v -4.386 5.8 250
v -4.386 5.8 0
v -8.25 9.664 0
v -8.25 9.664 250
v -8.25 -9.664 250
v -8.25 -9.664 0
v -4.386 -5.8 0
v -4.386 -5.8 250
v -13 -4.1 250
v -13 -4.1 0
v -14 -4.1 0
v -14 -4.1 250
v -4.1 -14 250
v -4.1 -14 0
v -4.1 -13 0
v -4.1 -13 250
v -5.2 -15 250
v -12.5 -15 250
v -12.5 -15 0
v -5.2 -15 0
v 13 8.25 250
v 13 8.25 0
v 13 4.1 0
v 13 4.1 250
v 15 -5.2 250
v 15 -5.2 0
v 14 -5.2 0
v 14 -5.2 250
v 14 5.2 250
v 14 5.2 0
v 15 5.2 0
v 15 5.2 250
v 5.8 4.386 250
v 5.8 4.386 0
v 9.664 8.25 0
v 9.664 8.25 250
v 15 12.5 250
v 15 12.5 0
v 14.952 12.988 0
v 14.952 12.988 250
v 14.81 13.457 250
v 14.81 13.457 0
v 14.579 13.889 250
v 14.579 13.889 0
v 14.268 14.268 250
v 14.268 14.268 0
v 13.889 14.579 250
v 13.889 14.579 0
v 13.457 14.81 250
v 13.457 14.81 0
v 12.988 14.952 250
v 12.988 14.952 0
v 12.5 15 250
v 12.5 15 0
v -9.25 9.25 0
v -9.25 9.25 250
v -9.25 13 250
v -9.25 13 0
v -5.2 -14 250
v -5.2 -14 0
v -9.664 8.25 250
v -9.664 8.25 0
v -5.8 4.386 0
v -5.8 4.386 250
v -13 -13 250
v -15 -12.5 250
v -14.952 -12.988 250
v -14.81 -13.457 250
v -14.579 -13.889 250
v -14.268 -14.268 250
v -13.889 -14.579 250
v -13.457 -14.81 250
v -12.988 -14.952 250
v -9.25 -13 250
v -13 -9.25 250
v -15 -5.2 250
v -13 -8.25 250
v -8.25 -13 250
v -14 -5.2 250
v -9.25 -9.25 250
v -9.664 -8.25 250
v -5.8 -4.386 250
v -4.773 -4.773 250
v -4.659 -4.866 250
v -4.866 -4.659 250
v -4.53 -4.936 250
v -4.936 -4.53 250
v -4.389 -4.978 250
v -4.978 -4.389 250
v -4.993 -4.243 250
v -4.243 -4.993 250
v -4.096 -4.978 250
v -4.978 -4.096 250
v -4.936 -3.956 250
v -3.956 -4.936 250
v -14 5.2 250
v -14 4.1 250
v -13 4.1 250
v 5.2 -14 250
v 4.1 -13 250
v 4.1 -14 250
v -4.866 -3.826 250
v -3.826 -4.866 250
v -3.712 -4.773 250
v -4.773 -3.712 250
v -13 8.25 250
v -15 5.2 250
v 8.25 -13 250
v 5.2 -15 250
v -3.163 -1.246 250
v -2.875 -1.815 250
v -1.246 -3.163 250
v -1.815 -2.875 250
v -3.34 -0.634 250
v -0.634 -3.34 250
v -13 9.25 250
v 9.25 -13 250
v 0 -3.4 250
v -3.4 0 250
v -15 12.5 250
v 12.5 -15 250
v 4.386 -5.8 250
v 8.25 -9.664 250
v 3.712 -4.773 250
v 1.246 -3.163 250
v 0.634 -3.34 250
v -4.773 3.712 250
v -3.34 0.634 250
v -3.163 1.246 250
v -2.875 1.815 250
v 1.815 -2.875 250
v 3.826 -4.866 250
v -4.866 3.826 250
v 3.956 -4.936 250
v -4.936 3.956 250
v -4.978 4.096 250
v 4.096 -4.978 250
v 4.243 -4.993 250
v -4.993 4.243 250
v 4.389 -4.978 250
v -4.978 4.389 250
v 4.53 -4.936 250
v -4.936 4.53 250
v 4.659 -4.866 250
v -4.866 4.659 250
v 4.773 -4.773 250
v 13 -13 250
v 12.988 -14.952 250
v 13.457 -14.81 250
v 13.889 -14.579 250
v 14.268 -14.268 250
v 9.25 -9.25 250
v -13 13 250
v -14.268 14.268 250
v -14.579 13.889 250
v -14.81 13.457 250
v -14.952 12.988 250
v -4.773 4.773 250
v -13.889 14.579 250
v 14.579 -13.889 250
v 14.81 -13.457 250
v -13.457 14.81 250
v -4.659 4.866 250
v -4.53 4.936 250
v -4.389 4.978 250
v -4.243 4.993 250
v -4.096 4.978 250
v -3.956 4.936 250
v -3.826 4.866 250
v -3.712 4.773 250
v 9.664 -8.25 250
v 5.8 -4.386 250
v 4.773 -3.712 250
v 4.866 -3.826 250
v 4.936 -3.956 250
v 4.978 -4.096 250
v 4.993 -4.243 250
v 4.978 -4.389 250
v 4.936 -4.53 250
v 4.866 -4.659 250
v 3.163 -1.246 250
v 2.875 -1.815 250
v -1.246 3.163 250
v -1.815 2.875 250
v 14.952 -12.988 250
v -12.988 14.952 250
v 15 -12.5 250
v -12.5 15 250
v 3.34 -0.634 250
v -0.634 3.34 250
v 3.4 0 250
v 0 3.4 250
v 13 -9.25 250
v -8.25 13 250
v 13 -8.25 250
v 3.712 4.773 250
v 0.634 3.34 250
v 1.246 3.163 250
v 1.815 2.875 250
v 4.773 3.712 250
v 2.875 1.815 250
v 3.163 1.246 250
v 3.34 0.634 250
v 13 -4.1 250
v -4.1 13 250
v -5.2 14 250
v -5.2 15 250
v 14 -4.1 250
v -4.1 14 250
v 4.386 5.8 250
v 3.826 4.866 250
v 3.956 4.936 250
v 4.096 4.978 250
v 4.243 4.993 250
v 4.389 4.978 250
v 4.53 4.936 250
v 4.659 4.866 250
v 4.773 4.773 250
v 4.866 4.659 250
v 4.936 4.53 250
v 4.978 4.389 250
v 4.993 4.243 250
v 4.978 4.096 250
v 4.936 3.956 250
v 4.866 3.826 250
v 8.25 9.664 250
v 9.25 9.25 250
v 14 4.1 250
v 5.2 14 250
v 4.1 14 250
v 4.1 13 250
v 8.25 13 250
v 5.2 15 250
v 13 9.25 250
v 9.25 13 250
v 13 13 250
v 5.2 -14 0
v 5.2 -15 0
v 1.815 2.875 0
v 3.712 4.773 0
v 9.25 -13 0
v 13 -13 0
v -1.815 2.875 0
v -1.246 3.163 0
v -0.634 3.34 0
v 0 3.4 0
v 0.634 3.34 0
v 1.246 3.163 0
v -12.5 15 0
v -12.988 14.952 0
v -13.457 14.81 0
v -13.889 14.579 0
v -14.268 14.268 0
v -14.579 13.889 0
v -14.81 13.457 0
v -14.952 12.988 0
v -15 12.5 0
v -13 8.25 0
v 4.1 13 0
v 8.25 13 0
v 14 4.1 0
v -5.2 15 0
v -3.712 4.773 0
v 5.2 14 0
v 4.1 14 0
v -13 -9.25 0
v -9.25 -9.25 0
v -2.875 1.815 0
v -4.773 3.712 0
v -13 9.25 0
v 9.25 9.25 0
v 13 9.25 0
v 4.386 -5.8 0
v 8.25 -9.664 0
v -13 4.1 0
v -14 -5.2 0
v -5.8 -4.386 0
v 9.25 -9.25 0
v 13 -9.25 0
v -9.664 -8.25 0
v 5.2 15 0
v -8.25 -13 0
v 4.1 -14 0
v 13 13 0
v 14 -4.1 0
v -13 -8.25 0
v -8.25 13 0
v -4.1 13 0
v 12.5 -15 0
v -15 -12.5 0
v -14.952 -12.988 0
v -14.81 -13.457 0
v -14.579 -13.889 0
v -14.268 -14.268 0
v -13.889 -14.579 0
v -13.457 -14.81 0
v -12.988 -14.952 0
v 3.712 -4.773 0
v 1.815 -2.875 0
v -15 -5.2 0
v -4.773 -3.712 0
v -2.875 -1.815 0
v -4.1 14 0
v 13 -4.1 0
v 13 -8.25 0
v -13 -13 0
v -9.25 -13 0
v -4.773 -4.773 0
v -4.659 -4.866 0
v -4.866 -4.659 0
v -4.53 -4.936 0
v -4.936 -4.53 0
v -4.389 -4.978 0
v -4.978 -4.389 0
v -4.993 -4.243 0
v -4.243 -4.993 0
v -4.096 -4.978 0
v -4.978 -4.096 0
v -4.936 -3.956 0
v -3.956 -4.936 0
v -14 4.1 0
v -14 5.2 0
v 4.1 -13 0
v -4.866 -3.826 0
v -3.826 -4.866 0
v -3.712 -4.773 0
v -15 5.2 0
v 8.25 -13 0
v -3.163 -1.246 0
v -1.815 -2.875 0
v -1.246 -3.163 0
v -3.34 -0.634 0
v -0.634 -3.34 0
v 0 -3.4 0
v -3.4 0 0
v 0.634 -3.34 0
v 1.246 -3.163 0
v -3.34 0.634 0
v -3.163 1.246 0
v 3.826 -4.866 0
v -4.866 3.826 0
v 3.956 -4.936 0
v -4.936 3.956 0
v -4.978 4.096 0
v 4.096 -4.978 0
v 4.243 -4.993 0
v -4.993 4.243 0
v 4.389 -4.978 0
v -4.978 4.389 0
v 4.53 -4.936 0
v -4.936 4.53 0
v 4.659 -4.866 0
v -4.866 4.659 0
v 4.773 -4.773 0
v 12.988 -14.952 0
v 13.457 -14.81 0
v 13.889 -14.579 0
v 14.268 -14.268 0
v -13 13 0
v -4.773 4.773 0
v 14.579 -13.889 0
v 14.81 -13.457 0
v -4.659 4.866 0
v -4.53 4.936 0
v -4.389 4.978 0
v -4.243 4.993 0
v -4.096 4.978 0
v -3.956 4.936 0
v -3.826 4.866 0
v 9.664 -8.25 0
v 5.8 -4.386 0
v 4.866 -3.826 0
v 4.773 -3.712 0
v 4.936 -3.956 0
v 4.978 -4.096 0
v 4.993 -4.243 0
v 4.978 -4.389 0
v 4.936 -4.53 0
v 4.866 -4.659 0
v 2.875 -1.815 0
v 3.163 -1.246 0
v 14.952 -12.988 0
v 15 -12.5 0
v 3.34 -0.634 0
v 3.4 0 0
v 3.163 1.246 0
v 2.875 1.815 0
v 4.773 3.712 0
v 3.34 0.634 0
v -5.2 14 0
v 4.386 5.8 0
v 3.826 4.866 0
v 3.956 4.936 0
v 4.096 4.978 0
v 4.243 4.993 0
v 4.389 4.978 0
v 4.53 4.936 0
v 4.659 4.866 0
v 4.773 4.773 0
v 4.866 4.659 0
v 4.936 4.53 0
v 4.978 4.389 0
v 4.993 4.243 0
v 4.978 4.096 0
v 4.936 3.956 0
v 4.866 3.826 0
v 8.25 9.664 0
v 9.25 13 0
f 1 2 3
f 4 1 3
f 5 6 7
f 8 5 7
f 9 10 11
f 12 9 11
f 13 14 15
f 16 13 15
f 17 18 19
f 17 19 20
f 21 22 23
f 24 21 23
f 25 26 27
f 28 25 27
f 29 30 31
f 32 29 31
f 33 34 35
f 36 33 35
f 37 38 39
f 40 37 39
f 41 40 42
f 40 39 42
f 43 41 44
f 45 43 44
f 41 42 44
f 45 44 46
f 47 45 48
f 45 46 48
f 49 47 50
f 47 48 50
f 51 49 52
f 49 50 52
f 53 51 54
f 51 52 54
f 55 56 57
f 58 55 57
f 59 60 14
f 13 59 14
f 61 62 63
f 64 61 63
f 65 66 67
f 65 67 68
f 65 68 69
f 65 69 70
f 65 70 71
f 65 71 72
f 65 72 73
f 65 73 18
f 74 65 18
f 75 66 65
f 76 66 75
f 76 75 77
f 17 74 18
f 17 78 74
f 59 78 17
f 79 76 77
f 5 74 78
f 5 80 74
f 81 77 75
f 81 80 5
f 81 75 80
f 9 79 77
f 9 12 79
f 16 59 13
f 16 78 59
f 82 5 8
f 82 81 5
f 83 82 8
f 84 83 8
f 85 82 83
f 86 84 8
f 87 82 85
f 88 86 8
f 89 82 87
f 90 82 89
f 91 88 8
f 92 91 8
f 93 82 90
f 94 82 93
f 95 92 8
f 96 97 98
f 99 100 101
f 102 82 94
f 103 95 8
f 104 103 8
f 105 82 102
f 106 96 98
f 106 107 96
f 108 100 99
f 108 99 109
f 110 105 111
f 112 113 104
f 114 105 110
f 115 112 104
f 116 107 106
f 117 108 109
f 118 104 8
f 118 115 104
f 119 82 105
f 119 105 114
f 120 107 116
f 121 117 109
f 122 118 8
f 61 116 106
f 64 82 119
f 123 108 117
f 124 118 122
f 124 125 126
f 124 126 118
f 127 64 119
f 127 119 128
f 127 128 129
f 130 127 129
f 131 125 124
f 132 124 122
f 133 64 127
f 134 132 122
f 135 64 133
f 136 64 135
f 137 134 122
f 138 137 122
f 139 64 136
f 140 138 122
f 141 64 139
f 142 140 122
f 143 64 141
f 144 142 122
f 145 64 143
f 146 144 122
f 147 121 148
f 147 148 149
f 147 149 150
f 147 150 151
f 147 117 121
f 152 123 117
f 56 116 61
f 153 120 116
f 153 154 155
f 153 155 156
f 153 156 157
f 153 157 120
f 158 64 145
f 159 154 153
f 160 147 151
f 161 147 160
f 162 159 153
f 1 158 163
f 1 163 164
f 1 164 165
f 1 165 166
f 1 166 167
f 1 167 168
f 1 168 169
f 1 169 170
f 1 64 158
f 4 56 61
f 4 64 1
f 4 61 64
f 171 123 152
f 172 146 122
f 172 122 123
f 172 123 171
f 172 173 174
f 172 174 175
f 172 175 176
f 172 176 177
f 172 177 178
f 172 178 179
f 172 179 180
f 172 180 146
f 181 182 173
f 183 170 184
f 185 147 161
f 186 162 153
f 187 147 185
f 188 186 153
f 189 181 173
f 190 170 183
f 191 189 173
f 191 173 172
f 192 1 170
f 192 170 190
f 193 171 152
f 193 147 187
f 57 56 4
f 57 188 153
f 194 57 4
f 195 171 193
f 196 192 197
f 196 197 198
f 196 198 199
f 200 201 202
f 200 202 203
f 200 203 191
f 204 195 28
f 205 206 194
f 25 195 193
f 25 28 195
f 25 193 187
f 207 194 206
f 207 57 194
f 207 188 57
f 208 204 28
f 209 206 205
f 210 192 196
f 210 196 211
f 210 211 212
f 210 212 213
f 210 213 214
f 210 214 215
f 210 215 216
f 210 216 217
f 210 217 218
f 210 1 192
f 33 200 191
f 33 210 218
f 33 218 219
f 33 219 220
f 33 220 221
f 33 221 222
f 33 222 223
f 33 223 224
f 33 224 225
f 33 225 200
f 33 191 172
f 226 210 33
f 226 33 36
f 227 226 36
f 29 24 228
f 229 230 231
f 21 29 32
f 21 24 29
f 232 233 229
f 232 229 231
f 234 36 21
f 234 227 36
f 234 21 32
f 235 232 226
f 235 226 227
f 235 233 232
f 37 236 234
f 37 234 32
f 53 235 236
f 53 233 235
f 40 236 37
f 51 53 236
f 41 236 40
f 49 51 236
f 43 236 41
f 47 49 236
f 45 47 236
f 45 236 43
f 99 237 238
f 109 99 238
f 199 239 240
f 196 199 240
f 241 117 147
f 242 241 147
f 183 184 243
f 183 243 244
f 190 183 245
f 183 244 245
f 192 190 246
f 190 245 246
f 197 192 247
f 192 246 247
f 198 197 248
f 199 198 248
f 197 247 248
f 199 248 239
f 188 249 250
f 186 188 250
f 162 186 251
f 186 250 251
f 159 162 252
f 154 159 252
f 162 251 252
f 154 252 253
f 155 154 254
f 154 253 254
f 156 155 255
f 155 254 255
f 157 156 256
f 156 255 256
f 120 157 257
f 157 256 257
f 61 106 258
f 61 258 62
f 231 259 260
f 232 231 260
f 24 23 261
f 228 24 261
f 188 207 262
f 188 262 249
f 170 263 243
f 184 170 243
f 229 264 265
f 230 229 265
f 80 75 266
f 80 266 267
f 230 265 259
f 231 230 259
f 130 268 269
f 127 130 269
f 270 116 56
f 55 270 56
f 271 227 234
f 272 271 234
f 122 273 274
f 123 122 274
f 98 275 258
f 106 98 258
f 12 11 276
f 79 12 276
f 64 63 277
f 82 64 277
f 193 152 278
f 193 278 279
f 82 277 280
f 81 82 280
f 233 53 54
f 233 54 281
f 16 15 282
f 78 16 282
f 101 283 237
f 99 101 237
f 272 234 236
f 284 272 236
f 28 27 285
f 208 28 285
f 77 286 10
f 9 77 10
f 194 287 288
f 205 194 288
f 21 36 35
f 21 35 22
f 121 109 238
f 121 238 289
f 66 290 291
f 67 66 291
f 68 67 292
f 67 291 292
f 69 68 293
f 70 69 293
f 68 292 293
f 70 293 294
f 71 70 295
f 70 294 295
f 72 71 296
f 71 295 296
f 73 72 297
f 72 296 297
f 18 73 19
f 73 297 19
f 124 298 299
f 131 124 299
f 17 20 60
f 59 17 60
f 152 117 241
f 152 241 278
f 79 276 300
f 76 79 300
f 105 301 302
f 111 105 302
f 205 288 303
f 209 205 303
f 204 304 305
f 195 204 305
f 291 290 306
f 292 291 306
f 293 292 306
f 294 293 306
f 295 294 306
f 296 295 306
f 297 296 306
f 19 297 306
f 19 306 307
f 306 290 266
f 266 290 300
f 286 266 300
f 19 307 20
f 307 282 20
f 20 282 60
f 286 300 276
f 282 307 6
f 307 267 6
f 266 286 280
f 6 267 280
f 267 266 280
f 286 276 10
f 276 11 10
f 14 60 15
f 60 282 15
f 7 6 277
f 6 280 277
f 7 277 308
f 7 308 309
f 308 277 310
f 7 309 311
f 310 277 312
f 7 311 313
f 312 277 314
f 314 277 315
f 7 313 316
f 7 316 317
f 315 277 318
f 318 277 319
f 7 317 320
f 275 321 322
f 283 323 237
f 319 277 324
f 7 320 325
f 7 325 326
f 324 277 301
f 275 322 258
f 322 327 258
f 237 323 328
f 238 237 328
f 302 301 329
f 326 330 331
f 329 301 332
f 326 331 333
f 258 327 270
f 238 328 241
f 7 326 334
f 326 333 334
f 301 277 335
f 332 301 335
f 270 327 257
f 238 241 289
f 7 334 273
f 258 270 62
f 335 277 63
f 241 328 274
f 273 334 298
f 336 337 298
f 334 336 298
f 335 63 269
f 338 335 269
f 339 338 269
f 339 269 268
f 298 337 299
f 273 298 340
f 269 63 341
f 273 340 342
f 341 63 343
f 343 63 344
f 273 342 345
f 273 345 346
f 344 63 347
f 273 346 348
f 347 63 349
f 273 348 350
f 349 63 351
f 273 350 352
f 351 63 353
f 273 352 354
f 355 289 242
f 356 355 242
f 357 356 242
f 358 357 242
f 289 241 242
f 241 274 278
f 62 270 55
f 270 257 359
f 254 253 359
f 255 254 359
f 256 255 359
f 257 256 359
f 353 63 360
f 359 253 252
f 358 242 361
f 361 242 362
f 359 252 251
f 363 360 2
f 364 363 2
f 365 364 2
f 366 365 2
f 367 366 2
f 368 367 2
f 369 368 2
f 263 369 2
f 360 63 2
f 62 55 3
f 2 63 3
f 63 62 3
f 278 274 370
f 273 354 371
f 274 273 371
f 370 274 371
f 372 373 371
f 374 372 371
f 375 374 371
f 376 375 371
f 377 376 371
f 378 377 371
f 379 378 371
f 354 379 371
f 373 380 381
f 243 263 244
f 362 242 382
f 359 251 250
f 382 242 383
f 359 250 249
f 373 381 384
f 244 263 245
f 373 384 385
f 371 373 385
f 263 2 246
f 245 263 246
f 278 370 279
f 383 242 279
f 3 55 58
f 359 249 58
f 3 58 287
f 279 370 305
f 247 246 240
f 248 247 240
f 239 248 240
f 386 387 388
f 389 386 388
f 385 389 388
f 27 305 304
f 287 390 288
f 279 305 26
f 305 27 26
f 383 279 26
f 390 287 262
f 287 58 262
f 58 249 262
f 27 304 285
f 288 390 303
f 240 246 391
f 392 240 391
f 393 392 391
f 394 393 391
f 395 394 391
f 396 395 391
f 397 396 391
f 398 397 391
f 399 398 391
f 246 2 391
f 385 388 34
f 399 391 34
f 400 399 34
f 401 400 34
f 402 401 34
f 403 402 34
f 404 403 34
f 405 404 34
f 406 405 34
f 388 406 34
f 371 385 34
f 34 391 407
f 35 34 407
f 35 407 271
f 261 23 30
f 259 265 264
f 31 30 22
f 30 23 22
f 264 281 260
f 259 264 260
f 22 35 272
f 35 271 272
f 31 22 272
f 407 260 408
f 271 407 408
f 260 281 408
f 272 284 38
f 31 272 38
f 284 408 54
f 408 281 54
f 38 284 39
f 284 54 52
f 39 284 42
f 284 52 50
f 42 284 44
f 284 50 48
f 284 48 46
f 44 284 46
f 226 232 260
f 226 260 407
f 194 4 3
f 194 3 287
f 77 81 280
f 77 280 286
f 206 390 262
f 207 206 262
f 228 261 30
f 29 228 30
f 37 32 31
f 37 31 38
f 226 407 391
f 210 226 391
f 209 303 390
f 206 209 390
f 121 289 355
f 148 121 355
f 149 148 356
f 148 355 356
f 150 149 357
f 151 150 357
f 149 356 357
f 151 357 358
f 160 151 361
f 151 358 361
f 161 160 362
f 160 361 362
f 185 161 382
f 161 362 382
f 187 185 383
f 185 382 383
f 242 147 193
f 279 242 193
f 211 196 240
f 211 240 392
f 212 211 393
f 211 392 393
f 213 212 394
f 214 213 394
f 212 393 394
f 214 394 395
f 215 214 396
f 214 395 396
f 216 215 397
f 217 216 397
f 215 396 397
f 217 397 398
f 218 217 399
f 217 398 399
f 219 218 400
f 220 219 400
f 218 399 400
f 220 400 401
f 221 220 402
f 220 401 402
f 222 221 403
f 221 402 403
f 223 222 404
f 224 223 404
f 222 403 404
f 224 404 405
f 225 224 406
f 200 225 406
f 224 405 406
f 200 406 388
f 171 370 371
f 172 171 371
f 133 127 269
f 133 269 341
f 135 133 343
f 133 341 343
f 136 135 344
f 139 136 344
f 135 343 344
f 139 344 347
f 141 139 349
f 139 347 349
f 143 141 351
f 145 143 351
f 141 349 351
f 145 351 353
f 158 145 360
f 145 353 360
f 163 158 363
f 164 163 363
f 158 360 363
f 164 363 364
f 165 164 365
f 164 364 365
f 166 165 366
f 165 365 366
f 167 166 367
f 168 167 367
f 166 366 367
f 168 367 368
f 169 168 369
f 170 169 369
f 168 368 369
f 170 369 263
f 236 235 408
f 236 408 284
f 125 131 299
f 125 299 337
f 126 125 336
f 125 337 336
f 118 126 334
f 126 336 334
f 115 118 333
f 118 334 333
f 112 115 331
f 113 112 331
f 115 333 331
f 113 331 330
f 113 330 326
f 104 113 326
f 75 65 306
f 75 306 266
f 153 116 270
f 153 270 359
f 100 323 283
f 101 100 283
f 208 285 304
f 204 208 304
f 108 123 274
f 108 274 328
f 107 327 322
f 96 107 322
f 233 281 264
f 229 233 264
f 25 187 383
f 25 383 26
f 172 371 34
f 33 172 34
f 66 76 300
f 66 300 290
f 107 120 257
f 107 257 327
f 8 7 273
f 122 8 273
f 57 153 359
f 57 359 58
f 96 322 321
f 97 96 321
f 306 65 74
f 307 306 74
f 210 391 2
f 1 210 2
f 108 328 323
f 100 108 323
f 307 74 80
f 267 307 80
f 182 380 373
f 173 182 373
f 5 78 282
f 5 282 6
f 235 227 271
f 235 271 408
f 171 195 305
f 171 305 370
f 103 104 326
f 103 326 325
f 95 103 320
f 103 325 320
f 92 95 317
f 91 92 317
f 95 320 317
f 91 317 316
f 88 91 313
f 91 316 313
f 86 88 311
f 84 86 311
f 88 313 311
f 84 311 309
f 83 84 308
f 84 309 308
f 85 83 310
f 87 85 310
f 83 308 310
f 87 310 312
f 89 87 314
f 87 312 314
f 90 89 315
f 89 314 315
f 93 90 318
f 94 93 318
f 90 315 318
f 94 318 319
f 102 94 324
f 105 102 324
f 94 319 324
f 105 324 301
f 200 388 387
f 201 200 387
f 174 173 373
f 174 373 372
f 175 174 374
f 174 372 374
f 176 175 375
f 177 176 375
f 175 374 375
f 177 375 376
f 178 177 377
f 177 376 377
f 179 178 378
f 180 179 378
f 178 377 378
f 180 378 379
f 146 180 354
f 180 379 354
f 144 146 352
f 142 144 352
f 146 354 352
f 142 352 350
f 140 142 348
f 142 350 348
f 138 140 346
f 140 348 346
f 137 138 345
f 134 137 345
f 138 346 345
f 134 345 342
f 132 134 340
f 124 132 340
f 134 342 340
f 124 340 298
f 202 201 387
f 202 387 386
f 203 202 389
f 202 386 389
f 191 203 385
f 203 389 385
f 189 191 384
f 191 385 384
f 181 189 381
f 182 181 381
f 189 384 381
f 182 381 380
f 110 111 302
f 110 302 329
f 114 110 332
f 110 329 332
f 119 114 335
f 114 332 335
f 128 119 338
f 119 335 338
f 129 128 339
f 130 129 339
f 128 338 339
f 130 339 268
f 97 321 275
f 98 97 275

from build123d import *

# Parameters (mm, degrees)
SKETCH_1_W      = 3.75
SKETCH_1_H      = 3.75
EXTRUDE_1_DEPTH = 250


with BuildPart() as part:
    # 草图1 → 凸台-拉伸1 (new body)
    with BuildSketch(Plane.XY):
        with BuildLine():
            Line((-5.2, -15), (-5.2, -14))
            Line((-5.2, -14), (-4.1, -14))
            Line((-4.1, -14), (-4.1, -13))
            Line((-4.1, -13), (-8.25, -13))
            Line((-8.25, -13), (-8.25, -9.664213562))
            Line((-8.25, -9.664213562), (-4.385786438, -5.8))
            Line((-4.385786438, -5.8), (4.385786438, -5.8))
            Line((4.385786438, -5.8), (8.25, -9.664213562))
            Line((8.25, -9.664213562), (8.25, -13))
            Line((8.25, -13), (4.1, -13))
            Line((4.1, -13), (4.1, -14))
            Line((4.1, -14), (5.2, -14))
            Line((5.2, -14), (5.2, -15))
            Line((5.2, -15), (12.5, -15))
            ThreePointArc((12.5, -15), (14.267766953, -14.267766953), (15, -12.5))
            Line((15, -12.5), (15, -5.2))
            Line((15, -5.2), (14, -5.2))
            Line((14, -5.2), (14, -4.1))
            Line((14, -4.1), (13, -4.1))
            Line((13, -4.1), (13, -8.25))
            Line((13, -8.25), (9.664213562, -8.25))
            Line((9.664213562, -8.25), (5.8, -4.385786438))
            Line((5.8, -4.385786438), (5.8, 4.385786438))
            Line((5.8, 4.385786438), (9.664213562, 8.25))
            Line((9.664213562, 8.25), (13, 8.25))
            Line((13, 8.25), (13, 4.1))
            Line((13, 4.1), (14, 4.1))
            Line((14, 4.1), (14, 5.2))
            Line((14, 5.2), (15, 5.2))
            Line((15, 5.2), (15, 12.5))
            ThreePointArc((15, 12.5), (14.267766953, 14.267766953), (12.5, 15))
            Line((12.5, 15), (5.2, 15))
            Line((5.2, 15), (5.2, 14))
            Line((5.2, 14), (4.1, 14))
            Line((4.1, 14), (4.1, 13))
            Line((4.1, 13), (8.25, 13))
            Line((8.25, 13), (8.25, 9.664213562))
            Line((8.25, 9.664213562), (4.385786438, 5.8))
            Line((4.385786438, 5.8), (-4.385786438, 5.8))
            Line((-4.385786438, 5.8), (-8.25, 9.664213562))
            Line((-8.25, 9.664213562), (-8.25, 13))
            Line((-8.25, 13), (-4.1, 13))
            Line((-4.1, 13), (-4.1, 14))
            Line((-4.1, 14), (-5.2, 14))
            Line((-5.2, 14), (-5.2, 15))
            Line((-5.2, 15), (-12.5, 15))
            ThreePointArc((-12.5, 15), (-14.267766953, 14.267766953), (-15, 12.5))
            Line((-15, 12.5), (-15, 5.2))
            Line((-15, 5.2), (-14, 5.2))
            Line((-14, 5.2), (-14, 4.1))
            Line((-14, 4.1), (-13, 4.1))
            Line((-13, 4.1), (-13, 8.25))
            Line((-13, 8.25), (-9.664213562, 8.25))
            Line((-9.664213562, 8.25), (-5.8, 4.385786438))
            Line((-5.8, 4.385786438), (-5.8, -4.385786438))
            Line((-5.8, -4.385786438), (-9.664213562, -8.25))
            Line((-9.664213562, -8.25), (-13, -8.25))
            Line((-13, -8.25), (-13, -4.1))
            Line((-13, -4.1), (-14, -4.1))
            Line((-14, -4.1), (-14, -5.2))
            Line((-14, -5.2), (-15, -5.2))
            Line((-15, -5.2), (-15, -12.5))
            ThreePointArc((-15, -12.5), (-14.267766953, -14.267766953), (-12.5, -15))
            Line((-12.5, -15), (-5.2, -15))
        make_face()
        with Locations((11.125, 11.125)):
            Rectangle(SKETCH_1_W, SKETCH_1_H, mode=Mode.SUBTRACT)
        with Locations((-11.125, 11.125)):
            Rectangle(SKETCH_1_W, SKETCH_1_H, mode=Mode.SUBTRACT)
        with Locations((-11.125, -11.125)):
            Rectangle(SKETCH_1_W, SKETCH_1_H, mode=Mode.SUBTRACT)
        with Locations((11.125, -11.125)):
            Rectangle(SKETCH_1_W, SKETCH_1_H, mode=Mode.SUBTRACT)
        with BuildLine():
            Line((-3.712310601, 4.772970773), (-1.814611278, 2.87527145))
            ThreePointArc((-1.814611278, 2.87527145), (0, 3.4), (1.814611278, 2.87527145))
            Line((1.814611278, 2.87527145), (3.712310601, 4.772970773))
            ThreePointArc((3.712310601, 4.772970773), (4.772970773, 4.772970773), (4.772970773, 3.712310601))
            Line((4.772970773, 3.712310601), (2.87527145, 1.814611278))
            ThreePointArc((2.87527145, 1.814611278), (3.4, 0), (2.87527145, -1.814611278))
            Line((2.87527145, -1.814611278), (4.772970773, -3.712310601))
            ThreePointArc((4.772970773, -3.712310601), (4.772970773, -4.772970773), (3.712310601, -4.772970773))
            Line((3.712310601, -4.772970773), (1.814611278, -2.87527145))
            ThreePointArc((1.814611278, -2.87527145), (0, -3.4), (-1.814611278, -2.87527145))
            Line((-1.814611278, -2.87527145), (-3.712310601, -4.772970773))
            ThreePointArc((-3.712310601, -4.772970773), (-4.772970773, -4.772970773), (-4.772970773, -3.712310601))
            Line((-4.772970773, -3.712310601), (-2.87527145, -1.814611278))
            ThreePointArc((-2.87527145, -1.814611278), (-3.4, 0), (-2.87527145, 1.814611278))
            Line((-2.87527145, 1.814611278), (-4.772970773, 3.712310601))
            ThreePointArc((-4.772970773, 3.712310601), (-4.772970773, 4.772970773), (-3.712310601, 4.772970773))
        make_face(mode=Mode.SUBTRACT)
    extrude(amount=EXTRUDE_1_DEPTH)


solid = part.part
